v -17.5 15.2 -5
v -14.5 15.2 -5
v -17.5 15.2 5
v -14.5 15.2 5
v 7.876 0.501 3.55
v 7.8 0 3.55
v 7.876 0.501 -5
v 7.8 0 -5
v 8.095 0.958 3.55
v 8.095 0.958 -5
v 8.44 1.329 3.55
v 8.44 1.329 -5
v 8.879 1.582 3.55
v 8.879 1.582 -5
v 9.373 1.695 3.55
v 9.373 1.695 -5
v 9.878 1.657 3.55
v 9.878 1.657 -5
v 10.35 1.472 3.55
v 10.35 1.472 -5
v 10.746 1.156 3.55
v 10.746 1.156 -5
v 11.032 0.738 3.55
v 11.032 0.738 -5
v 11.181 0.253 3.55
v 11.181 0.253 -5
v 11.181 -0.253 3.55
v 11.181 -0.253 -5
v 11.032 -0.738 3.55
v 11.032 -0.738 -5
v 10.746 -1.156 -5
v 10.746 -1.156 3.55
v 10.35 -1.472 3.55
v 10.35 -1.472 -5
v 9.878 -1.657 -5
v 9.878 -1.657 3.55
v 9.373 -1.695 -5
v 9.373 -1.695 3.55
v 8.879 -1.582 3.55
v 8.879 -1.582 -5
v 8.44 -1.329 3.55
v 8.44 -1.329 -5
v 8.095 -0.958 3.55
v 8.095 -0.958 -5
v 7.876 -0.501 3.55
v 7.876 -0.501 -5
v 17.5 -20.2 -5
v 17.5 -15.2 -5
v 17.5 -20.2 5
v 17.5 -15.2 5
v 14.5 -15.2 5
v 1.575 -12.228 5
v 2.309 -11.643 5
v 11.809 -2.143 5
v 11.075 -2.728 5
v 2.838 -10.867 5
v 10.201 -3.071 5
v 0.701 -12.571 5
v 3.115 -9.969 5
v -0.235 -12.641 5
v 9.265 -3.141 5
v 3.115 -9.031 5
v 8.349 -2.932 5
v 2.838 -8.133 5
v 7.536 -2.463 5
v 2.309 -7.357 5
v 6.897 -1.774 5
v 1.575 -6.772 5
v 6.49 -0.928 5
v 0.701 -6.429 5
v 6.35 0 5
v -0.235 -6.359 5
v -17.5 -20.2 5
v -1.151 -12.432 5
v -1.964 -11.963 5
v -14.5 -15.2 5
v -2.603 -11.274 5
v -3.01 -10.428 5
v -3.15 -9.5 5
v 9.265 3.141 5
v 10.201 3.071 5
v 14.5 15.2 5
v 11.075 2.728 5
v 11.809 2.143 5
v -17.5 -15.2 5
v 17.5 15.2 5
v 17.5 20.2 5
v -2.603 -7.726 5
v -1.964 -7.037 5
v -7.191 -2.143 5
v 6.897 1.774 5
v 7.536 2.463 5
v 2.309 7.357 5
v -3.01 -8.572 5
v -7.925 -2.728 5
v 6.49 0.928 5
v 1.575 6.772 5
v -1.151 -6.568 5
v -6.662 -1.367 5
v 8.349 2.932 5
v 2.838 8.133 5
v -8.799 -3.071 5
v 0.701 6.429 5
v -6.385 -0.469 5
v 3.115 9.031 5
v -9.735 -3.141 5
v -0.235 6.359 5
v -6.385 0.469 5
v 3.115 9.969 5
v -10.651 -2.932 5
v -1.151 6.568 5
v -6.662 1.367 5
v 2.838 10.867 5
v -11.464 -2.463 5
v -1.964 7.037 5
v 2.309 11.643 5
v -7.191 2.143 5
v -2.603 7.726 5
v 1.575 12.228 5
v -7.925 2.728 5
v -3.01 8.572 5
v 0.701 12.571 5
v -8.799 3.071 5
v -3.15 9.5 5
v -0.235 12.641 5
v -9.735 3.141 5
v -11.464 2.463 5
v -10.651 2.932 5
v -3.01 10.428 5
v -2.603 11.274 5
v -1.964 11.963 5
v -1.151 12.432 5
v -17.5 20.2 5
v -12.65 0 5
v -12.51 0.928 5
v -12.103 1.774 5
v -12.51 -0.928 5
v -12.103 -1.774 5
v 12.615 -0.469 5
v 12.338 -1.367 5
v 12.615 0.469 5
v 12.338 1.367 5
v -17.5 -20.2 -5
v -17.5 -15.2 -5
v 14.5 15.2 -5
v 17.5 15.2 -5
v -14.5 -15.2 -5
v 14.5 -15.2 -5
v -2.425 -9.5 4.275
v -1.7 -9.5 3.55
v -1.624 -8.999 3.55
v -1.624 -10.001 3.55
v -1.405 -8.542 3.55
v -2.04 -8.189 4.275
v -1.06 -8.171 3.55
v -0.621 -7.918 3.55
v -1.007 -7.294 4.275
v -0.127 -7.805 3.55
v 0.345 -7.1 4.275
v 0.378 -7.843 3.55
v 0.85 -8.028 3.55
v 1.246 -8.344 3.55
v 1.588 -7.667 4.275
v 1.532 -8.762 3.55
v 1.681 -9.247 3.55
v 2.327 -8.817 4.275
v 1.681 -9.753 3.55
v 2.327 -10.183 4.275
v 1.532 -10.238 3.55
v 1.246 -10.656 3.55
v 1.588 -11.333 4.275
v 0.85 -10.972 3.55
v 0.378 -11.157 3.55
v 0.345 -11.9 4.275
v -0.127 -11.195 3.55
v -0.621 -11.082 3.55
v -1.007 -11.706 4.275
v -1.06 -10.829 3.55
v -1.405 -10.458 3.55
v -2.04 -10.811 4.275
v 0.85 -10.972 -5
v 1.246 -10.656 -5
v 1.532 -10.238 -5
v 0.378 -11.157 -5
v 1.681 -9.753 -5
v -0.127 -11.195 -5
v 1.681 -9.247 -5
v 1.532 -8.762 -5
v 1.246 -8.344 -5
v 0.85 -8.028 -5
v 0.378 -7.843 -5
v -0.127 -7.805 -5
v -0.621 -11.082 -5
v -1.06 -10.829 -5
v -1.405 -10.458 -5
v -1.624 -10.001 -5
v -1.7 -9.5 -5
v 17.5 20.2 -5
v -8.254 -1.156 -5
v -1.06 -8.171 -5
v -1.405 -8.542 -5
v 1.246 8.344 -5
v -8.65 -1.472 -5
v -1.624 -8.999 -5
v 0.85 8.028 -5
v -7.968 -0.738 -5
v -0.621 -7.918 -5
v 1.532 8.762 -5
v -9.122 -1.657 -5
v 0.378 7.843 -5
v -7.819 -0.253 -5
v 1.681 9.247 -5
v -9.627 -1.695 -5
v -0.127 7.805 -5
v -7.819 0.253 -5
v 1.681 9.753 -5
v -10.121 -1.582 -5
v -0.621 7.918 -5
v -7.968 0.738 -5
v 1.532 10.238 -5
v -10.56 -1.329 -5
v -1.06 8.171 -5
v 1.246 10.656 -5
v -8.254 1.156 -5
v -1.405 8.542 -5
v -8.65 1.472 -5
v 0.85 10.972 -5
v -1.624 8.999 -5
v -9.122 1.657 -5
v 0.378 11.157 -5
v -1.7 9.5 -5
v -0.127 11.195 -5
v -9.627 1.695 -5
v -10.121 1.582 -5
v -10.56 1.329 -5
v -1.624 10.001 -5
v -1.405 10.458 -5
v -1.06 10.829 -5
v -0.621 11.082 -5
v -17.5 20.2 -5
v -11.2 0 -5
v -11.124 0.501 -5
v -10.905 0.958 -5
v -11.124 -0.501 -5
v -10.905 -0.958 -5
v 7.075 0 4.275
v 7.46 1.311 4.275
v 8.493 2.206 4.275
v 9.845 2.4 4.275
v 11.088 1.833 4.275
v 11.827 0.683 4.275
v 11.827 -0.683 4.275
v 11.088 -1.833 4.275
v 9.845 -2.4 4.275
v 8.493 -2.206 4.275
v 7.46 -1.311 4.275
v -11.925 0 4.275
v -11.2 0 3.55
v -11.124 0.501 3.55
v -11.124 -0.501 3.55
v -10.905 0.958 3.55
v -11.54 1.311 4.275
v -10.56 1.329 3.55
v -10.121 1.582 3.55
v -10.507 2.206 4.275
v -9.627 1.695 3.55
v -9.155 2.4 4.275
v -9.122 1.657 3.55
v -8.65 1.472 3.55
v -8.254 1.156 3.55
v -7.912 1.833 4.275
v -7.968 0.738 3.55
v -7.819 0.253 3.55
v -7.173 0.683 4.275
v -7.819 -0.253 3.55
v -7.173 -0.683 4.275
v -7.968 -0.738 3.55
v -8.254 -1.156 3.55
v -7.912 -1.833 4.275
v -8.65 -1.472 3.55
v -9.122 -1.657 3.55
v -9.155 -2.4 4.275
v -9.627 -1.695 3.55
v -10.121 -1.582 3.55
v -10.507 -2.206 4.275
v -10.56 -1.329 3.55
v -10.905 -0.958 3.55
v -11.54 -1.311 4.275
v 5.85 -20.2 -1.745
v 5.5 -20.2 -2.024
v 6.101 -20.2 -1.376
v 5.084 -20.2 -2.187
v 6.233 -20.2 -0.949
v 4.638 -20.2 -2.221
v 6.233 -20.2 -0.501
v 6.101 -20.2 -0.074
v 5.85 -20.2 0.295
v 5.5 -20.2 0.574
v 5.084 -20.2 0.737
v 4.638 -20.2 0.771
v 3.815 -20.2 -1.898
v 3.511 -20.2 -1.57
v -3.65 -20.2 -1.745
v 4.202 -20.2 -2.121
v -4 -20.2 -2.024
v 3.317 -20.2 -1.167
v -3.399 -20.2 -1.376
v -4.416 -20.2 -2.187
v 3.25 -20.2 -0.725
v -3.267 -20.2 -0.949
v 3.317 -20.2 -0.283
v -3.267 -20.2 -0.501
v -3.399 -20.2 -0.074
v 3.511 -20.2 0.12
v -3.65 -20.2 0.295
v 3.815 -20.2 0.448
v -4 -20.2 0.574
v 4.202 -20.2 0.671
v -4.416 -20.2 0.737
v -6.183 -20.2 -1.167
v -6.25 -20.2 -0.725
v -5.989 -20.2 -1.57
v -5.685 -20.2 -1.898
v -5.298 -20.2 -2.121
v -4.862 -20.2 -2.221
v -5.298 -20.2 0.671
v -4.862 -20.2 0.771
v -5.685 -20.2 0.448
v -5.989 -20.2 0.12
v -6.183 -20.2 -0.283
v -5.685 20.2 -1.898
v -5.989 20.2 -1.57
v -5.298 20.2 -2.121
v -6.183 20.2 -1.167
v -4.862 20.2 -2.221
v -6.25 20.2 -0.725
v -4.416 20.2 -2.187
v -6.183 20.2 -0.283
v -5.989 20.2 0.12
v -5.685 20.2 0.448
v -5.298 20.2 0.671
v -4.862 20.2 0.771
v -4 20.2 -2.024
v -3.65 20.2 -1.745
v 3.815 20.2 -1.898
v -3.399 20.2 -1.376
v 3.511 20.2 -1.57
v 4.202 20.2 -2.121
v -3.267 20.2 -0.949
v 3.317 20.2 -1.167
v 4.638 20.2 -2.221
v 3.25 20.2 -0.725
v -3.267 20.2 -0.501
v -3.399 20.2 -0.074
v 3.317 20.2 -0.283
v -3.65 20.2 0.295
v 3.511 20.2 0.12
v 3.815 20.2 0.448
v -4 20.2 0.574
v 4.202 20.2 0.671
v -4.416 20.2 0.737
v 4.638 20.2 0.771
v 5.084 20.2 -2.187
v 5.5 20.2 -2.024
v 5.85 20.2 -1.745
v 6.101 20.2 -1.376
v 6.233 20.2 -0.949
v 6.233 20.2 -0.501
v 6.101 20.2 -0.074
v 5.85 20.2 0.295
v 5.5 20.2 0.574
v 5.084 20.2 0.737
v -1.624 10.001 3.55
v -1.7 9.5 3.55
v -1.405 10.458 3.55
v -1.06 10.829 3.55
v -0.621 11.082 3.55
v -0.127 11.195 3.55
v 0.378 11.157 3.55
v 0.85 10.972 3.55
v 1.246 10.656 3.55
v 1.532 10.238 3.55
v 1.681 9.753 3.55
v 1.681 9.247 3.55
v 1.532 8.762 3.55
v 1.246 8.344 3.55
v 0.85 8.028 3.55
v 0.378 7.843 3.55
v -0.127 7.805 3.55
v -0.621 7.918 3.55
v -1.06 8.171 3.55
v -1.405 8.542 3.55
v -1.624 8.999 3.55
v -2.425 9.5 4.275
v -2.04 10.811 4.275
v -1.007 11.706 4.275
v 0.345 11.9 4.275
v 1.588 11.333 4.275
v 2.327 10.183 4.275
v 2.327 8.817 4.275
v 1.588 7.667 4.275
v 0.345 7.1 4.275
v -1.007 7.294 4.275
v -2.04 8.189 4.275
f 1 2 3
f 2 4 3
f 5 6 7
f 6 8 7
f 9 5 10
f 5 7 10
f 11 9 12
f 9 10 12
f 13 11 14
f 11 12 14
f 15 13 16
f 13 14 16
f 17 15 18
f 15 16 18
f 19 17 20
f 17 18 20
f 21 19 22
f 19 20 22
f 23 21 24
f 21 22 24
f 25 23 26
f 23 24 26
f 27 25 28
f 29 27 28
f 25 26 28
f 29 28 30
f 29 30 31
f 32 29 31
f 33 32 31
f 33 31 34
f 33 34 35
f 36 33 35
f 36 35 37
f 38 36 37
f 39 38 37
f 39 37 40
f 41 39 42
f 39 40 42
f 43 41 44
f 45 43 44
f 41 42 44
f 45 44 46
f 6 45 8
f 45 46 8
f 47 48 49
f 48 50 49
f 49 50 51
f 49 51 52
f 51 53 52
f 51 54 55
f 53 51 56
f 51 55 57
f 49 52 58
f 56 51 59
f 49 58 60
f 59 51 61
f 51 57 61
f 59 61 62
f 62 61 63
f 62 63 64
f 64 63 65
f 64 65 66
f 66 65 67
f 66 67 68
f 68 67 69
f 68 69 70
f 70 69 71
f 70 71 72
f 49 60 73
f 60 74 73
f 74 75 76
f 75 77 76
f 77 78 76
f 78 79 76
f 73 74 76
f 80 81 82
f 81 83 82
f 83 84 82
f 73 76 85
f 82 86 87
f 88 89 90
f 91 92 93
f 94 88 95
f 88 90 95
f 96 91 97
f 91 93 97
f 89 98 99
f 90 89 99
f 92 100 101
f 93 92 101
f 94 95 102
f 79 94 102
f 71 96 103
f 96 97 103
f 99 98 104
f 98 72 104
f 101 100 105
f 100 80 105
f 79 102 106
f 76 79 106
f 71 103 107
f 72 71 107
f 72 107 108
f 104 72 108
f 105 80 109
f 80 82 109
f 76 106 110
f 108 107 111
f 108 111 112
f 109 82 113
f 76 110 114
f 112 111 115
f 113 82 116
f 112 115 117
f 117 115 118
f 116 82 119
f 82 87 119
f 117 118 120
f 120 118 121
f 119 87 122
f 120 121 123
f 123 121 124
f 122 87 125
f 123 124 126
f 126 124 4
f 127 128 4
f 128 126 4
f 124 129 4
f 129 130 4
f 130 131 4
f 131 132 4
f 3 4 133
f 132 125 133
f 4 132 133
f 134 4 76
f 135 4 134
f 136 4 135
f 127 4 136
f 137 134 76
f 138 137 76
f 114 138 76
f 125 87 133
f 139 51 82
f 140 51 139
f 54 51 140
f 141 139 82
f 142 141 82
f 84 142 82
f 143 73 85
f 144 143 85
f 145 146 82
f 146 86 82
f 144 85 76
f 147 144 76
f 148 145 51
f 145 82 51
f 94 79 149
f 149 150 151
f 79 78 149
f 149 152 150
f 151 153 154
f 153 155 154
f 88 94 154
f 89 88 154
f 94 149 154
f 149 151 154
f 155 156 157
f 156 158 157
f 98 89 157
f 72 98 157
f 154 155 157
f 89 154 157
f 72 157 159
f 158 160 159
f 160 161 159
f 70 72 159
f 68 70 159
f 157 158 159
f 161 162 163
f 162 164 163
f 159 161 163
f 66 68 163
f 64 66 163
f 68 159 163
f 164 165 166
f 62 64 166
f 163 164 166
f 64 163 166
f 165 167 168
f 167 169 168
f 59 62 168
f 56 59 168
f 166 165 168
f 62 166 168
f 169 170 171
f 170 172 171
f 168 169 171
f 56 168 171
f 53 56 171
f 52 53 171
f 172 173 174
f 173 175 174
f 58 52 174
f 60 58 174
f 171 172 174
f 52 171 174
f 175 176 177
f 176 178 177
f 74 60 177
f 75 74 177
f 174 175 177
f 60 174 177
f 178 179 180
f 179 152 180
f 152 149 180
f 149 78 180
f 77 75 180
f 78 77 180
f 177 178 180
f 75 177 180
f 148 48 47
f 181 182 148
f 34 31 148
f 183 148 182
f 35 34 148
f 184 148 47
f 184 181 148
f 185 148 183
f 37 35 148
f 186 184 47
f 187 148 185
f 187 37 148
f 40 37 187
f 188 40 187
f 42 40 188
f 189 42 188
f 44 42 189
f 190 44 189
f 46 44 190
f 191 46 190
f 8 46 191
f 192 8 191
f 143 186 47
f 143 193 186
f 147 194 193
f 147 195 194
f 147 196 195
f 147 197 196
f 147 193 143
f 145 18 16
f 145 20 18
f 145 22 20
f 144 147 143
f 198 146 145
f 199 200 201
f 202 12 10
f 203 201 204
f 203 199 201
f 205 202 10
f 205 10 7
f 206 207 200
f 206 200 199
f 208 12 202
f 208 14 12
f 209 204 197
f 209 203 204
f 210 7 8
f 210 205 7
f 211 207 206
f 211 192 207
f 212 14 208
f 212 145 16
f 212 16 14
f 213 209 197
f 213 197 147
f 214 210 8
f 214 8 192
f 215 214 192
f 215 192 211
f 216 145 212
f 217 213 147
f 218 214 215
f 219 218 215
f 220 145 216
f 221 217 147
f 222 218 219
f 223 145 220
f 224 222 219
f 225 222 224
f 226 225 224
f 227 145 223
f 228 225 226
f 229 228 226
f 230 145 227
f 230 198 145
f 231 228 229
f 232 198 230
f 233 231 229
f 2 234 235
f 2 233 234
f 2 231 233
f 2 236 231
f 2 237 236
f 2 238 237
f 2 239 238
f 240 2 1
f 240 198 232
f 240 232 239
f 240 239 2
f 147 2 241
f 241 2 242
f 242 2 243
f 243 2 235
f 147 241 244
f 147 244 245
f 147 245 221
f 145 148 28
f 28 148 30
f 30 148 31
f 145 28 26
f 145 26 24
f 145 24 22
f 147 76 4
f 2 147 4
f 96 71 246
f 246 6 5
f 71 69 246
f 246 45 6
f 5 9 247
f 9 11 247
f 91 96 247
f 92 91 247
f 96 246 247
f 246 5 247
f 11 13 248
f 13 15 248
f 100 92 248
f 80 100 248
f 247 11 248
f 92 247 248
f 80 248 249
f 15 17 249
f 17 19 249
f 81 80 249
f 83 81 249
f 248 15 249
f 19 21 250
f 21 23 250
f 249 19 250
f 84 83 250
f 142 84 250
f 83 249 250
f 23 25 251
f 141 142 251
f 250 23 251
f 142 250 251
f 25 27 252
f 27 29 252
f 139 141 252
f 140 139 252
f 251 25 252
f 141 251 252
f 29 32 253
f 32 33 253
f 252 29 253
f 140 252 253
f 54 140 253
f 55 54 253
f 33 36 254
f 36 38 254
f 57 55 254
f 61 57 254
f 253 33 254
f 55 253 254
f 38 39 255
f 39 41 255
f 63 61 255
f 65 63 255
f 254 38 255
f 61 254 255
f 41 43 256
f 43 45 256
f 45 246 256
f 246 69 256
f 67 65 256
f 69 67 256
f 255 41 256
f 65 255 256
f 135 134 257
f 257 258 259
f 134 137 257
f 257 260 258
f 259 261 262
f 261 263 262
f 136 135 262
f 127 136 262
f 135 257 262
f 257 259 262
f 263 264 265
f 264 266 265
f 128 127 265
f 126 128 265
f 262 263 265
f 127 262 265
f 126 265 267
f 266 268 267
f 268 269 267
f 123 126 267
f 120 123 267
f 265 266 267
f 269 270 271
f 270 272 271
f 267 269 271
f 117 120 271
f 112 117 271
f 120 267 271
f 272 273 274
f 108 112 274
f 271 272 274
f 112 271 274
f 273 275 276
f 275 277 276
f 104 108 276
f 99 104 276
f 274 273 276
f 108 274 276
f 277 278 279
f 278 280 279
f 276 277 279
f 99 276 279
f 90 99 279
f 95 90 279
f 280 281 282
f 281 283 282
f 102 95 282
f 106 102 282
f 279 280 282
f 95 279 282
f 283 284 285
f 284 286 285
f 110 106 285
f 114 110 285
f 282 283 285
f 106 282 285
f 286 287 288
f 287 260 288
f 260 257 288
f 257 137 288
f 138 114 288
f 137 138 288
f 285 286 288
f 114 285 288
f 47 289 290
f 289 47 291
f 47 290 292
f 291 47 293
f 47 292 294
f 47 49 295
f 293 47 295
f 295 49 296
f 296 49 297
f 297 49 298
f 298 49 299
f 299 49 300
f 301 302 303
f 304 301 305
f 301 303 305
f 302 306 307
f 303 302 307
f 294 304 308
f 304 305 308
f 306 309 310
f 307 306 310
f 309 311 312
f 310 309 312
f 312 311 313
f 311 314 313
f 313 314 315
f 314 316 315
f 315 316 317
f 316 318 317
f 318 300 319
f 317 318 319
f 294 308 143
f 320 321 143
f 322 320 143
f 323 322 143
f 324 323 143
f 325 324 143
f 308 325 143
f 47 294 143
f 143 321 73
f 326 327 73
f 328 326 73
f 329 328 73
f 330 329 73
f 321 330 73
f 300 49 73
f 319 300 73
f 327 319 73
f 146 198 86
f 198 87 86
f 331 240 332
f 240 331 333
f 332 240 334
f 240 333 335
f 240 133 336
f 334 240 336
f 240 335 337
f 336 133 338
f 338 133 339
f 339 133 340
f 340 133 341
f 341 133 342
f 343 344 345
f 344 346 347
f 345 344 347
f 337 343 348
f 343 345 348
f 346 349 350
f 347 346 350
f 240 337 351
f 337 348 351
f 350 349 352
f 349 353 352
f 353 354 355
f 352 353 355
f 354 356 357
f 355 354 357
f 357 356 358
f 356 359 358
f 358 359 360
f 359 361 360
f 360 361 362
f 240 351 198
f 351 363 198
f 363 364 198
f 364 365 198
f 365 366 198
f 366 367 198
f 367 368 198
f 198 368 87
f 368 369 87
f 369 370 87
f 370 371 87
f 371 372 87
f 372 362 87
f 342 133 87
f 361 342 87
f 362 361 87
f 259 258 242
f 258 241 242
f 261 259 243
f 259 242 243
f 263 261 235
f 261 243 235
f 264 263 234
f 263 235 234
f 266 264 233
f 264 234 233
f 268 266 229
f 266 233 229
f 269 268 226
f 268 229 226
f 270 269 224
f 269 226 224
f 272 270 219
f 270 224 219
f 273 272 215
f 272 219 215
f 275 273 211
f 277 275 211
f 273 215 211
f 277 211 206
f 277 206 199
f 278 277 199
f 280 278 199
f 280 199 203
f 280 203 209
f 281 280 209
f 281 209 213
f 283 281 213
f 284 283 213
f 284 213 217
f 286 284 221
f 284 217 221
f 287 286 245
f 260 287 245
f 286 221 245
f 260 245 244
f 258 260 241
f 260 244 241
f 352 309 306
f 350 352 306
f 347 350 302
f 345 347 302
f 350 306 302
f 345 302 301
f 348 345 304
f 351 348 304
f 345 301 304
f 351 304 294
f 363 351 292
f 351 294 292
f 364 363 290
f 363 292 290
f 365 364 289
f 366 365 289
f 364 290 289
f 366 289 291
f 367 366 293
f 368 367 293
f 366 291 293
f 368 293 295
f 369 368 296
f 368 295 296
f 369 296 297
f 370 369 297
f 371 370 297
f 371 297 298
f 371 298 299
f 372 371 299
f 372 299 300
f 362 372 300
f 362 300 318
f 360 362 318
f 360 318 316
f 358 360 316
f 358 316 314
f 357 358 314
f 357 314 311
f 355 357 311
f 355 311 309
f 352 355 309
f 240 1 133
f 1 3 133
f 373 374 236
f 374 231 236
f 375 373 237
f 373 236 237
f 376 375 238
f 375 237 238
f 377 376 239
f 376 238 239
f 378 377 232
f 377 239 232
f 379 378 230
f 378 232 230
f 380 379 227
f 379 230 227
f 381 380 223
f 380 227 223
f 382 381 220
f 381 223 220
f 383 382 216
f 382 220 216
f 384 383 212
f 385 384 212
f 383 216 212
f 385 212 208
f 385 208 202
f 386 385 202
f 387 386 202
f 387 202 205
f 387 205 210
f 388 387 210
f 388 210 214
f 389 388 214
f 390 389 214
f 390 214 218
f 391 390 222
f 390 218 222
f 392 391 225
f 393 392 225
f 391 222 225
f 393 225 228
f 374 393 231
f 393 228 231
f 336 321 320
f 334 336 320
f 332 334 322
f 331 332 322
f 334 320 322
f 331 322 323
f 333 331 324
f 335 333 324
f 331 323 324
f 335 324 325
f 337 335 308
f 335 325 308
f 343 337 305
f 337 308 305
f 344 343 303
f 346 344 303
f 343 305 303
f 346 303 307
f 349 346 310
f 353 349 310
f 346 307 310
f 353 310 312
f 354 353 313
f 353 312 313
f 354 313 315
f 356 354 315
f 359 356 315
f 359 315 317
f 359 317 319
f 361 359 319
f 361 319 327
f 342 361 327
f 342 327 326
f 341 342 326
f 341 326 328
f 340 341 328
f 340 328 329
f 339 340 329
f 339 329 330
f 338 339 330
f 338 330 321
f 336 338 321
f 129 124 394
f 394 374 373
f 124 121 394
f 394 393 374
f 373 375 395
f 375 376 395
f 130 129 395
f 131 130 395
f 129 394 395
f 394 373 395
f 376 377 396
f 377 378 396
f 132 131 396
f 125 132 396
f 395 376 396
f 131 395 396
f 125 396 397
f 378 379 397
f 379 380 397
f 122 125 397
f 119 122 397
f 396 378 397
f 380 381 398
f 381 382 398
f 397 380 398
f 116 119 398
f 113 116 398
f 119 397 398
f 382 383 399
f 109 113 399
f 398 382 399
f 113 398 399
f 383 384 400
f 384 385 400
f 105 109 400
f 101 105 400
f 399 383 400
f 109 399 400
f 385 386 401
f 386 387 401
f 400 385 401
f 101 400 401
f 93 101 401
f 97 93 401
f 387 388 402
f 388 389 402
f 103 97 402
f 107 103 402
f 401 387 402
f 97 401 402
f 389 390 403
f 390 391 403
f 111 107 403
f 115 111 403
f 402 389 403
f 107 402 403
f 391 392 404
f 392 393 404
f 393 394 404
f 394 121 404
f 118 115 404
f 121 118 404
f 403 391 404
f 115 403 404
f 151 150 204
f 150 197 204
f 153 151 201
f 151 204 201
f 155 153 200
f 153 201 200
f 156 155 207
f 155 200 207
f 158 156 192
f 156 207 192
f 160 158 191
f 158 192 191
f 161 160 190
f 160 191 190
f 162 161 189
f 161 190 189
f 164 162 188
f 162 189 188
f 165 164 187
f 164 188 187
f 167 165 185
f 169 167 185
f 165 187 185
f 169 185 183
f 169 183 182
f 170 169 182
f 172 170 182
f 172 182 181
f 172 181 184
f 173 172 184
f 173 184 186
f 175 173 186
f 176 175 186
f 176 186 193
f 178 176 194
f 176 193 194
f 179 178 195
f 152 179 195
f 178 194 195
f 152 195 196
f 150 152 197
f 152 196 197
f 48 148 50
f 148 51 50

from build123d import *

# Parameters (mm, degrees)
BOSS_EXTRUDE1_DEPTH                             = 5
CSK_FOR_M3_FLAT_HEAD_MACHINE_SCREW1_D           = 3.4
CSK_FOR_M3_FLAT_HEAD_MACHINE_SCREW1_DEPTH       = 15.4
CSK_FOR_M3_FLAT_HEAD_MACHINE_SCREW1_CSINK_D     = 6.3
CSK_FOR_M3_FLAT_HEAD_MACHINE_SCREW1_CSINK_ANGLE = 90
CSK_FOR_M3_FLAT_HEAD_MACHINE_SCREW1_TIP         = 1.041353257
F_3_0MM_DOWEL_HOLE1_D                           = 3


with BuildPart() as part:
    # Sketch2 → Boss-Extrude1 (new, symmetric)
    with BuildSketch(Plane.XY):
        Polygon((-14.5, -15.2), (-14.5, 15.2), (-17.5, 15.2), (-17.5, 20.2), (17.5, 20.2), (17.5, 15.2), (14.5, 15.2), (14.5, -15.2), (17.5, -15.2), (17.5, -20.2), (-17.5, -20.2), (-17.5, -15.2), align=None)
    extrude(amount=BOSS_EXTRUDE1_DEPTH, both=True)

    # CSK for M3 Flat Head Machine Screw1
    with Locations(Plane(origin=(-9.5, 0, 5), x_dir=(1, 0, 0), z_dir=(0, 0, 1))):
        with Locations((0, 0), (9.5, 9.5), (19, 0), (9.5, -9.5)):
            CounterSinkHole(CSK_FOR_M3_FLAT_HEAD_MACHINE_SCREW1_D / 2, CSK_FOR_M3_FLAT_HEAD_MACHINE_SCREW1_CSINK_D / 2, depth=CSK_FOR_M3_FLAT_HEAD_MACHINE_SCREW1_DEPTH, counter_sink_angle=CSK_FOR_M3_FLAT_HEAD_MACHINE_SCREW1_CSINK_ANGLE)
            with Locations((0, 0, -(CSK_FOR_M3_FLAT_HEAD_MACHINE_SCREW1_DEPTH + CSK_FOR_M3_FLAT_HEAD_MACHINE_SCREW1_TIP / 2))):  # 117.02° drill point
                Cone(0, CSK_FOR_M3_FLAT_HEAD_MACHINE_SCREW1_D / 2, CSK_FOR_M3_FLAT_HEAD_MACHINE_SCREW1_TIP, mode=Mode.SUBTRACT)

    # Ø3.0mm Dowel Hole1 (through all)
    with Locations(Plane(origin=(0, 20.2, 0), x_dir=(1, 0, 0), z_dir=(0, 1, 0))):
        with Locations((-4.75, 0.725), (4.75, 0.725)):
            Hole(F_3_0MM_DOWEL_HOLE1_D / 2)


solid = part.part
